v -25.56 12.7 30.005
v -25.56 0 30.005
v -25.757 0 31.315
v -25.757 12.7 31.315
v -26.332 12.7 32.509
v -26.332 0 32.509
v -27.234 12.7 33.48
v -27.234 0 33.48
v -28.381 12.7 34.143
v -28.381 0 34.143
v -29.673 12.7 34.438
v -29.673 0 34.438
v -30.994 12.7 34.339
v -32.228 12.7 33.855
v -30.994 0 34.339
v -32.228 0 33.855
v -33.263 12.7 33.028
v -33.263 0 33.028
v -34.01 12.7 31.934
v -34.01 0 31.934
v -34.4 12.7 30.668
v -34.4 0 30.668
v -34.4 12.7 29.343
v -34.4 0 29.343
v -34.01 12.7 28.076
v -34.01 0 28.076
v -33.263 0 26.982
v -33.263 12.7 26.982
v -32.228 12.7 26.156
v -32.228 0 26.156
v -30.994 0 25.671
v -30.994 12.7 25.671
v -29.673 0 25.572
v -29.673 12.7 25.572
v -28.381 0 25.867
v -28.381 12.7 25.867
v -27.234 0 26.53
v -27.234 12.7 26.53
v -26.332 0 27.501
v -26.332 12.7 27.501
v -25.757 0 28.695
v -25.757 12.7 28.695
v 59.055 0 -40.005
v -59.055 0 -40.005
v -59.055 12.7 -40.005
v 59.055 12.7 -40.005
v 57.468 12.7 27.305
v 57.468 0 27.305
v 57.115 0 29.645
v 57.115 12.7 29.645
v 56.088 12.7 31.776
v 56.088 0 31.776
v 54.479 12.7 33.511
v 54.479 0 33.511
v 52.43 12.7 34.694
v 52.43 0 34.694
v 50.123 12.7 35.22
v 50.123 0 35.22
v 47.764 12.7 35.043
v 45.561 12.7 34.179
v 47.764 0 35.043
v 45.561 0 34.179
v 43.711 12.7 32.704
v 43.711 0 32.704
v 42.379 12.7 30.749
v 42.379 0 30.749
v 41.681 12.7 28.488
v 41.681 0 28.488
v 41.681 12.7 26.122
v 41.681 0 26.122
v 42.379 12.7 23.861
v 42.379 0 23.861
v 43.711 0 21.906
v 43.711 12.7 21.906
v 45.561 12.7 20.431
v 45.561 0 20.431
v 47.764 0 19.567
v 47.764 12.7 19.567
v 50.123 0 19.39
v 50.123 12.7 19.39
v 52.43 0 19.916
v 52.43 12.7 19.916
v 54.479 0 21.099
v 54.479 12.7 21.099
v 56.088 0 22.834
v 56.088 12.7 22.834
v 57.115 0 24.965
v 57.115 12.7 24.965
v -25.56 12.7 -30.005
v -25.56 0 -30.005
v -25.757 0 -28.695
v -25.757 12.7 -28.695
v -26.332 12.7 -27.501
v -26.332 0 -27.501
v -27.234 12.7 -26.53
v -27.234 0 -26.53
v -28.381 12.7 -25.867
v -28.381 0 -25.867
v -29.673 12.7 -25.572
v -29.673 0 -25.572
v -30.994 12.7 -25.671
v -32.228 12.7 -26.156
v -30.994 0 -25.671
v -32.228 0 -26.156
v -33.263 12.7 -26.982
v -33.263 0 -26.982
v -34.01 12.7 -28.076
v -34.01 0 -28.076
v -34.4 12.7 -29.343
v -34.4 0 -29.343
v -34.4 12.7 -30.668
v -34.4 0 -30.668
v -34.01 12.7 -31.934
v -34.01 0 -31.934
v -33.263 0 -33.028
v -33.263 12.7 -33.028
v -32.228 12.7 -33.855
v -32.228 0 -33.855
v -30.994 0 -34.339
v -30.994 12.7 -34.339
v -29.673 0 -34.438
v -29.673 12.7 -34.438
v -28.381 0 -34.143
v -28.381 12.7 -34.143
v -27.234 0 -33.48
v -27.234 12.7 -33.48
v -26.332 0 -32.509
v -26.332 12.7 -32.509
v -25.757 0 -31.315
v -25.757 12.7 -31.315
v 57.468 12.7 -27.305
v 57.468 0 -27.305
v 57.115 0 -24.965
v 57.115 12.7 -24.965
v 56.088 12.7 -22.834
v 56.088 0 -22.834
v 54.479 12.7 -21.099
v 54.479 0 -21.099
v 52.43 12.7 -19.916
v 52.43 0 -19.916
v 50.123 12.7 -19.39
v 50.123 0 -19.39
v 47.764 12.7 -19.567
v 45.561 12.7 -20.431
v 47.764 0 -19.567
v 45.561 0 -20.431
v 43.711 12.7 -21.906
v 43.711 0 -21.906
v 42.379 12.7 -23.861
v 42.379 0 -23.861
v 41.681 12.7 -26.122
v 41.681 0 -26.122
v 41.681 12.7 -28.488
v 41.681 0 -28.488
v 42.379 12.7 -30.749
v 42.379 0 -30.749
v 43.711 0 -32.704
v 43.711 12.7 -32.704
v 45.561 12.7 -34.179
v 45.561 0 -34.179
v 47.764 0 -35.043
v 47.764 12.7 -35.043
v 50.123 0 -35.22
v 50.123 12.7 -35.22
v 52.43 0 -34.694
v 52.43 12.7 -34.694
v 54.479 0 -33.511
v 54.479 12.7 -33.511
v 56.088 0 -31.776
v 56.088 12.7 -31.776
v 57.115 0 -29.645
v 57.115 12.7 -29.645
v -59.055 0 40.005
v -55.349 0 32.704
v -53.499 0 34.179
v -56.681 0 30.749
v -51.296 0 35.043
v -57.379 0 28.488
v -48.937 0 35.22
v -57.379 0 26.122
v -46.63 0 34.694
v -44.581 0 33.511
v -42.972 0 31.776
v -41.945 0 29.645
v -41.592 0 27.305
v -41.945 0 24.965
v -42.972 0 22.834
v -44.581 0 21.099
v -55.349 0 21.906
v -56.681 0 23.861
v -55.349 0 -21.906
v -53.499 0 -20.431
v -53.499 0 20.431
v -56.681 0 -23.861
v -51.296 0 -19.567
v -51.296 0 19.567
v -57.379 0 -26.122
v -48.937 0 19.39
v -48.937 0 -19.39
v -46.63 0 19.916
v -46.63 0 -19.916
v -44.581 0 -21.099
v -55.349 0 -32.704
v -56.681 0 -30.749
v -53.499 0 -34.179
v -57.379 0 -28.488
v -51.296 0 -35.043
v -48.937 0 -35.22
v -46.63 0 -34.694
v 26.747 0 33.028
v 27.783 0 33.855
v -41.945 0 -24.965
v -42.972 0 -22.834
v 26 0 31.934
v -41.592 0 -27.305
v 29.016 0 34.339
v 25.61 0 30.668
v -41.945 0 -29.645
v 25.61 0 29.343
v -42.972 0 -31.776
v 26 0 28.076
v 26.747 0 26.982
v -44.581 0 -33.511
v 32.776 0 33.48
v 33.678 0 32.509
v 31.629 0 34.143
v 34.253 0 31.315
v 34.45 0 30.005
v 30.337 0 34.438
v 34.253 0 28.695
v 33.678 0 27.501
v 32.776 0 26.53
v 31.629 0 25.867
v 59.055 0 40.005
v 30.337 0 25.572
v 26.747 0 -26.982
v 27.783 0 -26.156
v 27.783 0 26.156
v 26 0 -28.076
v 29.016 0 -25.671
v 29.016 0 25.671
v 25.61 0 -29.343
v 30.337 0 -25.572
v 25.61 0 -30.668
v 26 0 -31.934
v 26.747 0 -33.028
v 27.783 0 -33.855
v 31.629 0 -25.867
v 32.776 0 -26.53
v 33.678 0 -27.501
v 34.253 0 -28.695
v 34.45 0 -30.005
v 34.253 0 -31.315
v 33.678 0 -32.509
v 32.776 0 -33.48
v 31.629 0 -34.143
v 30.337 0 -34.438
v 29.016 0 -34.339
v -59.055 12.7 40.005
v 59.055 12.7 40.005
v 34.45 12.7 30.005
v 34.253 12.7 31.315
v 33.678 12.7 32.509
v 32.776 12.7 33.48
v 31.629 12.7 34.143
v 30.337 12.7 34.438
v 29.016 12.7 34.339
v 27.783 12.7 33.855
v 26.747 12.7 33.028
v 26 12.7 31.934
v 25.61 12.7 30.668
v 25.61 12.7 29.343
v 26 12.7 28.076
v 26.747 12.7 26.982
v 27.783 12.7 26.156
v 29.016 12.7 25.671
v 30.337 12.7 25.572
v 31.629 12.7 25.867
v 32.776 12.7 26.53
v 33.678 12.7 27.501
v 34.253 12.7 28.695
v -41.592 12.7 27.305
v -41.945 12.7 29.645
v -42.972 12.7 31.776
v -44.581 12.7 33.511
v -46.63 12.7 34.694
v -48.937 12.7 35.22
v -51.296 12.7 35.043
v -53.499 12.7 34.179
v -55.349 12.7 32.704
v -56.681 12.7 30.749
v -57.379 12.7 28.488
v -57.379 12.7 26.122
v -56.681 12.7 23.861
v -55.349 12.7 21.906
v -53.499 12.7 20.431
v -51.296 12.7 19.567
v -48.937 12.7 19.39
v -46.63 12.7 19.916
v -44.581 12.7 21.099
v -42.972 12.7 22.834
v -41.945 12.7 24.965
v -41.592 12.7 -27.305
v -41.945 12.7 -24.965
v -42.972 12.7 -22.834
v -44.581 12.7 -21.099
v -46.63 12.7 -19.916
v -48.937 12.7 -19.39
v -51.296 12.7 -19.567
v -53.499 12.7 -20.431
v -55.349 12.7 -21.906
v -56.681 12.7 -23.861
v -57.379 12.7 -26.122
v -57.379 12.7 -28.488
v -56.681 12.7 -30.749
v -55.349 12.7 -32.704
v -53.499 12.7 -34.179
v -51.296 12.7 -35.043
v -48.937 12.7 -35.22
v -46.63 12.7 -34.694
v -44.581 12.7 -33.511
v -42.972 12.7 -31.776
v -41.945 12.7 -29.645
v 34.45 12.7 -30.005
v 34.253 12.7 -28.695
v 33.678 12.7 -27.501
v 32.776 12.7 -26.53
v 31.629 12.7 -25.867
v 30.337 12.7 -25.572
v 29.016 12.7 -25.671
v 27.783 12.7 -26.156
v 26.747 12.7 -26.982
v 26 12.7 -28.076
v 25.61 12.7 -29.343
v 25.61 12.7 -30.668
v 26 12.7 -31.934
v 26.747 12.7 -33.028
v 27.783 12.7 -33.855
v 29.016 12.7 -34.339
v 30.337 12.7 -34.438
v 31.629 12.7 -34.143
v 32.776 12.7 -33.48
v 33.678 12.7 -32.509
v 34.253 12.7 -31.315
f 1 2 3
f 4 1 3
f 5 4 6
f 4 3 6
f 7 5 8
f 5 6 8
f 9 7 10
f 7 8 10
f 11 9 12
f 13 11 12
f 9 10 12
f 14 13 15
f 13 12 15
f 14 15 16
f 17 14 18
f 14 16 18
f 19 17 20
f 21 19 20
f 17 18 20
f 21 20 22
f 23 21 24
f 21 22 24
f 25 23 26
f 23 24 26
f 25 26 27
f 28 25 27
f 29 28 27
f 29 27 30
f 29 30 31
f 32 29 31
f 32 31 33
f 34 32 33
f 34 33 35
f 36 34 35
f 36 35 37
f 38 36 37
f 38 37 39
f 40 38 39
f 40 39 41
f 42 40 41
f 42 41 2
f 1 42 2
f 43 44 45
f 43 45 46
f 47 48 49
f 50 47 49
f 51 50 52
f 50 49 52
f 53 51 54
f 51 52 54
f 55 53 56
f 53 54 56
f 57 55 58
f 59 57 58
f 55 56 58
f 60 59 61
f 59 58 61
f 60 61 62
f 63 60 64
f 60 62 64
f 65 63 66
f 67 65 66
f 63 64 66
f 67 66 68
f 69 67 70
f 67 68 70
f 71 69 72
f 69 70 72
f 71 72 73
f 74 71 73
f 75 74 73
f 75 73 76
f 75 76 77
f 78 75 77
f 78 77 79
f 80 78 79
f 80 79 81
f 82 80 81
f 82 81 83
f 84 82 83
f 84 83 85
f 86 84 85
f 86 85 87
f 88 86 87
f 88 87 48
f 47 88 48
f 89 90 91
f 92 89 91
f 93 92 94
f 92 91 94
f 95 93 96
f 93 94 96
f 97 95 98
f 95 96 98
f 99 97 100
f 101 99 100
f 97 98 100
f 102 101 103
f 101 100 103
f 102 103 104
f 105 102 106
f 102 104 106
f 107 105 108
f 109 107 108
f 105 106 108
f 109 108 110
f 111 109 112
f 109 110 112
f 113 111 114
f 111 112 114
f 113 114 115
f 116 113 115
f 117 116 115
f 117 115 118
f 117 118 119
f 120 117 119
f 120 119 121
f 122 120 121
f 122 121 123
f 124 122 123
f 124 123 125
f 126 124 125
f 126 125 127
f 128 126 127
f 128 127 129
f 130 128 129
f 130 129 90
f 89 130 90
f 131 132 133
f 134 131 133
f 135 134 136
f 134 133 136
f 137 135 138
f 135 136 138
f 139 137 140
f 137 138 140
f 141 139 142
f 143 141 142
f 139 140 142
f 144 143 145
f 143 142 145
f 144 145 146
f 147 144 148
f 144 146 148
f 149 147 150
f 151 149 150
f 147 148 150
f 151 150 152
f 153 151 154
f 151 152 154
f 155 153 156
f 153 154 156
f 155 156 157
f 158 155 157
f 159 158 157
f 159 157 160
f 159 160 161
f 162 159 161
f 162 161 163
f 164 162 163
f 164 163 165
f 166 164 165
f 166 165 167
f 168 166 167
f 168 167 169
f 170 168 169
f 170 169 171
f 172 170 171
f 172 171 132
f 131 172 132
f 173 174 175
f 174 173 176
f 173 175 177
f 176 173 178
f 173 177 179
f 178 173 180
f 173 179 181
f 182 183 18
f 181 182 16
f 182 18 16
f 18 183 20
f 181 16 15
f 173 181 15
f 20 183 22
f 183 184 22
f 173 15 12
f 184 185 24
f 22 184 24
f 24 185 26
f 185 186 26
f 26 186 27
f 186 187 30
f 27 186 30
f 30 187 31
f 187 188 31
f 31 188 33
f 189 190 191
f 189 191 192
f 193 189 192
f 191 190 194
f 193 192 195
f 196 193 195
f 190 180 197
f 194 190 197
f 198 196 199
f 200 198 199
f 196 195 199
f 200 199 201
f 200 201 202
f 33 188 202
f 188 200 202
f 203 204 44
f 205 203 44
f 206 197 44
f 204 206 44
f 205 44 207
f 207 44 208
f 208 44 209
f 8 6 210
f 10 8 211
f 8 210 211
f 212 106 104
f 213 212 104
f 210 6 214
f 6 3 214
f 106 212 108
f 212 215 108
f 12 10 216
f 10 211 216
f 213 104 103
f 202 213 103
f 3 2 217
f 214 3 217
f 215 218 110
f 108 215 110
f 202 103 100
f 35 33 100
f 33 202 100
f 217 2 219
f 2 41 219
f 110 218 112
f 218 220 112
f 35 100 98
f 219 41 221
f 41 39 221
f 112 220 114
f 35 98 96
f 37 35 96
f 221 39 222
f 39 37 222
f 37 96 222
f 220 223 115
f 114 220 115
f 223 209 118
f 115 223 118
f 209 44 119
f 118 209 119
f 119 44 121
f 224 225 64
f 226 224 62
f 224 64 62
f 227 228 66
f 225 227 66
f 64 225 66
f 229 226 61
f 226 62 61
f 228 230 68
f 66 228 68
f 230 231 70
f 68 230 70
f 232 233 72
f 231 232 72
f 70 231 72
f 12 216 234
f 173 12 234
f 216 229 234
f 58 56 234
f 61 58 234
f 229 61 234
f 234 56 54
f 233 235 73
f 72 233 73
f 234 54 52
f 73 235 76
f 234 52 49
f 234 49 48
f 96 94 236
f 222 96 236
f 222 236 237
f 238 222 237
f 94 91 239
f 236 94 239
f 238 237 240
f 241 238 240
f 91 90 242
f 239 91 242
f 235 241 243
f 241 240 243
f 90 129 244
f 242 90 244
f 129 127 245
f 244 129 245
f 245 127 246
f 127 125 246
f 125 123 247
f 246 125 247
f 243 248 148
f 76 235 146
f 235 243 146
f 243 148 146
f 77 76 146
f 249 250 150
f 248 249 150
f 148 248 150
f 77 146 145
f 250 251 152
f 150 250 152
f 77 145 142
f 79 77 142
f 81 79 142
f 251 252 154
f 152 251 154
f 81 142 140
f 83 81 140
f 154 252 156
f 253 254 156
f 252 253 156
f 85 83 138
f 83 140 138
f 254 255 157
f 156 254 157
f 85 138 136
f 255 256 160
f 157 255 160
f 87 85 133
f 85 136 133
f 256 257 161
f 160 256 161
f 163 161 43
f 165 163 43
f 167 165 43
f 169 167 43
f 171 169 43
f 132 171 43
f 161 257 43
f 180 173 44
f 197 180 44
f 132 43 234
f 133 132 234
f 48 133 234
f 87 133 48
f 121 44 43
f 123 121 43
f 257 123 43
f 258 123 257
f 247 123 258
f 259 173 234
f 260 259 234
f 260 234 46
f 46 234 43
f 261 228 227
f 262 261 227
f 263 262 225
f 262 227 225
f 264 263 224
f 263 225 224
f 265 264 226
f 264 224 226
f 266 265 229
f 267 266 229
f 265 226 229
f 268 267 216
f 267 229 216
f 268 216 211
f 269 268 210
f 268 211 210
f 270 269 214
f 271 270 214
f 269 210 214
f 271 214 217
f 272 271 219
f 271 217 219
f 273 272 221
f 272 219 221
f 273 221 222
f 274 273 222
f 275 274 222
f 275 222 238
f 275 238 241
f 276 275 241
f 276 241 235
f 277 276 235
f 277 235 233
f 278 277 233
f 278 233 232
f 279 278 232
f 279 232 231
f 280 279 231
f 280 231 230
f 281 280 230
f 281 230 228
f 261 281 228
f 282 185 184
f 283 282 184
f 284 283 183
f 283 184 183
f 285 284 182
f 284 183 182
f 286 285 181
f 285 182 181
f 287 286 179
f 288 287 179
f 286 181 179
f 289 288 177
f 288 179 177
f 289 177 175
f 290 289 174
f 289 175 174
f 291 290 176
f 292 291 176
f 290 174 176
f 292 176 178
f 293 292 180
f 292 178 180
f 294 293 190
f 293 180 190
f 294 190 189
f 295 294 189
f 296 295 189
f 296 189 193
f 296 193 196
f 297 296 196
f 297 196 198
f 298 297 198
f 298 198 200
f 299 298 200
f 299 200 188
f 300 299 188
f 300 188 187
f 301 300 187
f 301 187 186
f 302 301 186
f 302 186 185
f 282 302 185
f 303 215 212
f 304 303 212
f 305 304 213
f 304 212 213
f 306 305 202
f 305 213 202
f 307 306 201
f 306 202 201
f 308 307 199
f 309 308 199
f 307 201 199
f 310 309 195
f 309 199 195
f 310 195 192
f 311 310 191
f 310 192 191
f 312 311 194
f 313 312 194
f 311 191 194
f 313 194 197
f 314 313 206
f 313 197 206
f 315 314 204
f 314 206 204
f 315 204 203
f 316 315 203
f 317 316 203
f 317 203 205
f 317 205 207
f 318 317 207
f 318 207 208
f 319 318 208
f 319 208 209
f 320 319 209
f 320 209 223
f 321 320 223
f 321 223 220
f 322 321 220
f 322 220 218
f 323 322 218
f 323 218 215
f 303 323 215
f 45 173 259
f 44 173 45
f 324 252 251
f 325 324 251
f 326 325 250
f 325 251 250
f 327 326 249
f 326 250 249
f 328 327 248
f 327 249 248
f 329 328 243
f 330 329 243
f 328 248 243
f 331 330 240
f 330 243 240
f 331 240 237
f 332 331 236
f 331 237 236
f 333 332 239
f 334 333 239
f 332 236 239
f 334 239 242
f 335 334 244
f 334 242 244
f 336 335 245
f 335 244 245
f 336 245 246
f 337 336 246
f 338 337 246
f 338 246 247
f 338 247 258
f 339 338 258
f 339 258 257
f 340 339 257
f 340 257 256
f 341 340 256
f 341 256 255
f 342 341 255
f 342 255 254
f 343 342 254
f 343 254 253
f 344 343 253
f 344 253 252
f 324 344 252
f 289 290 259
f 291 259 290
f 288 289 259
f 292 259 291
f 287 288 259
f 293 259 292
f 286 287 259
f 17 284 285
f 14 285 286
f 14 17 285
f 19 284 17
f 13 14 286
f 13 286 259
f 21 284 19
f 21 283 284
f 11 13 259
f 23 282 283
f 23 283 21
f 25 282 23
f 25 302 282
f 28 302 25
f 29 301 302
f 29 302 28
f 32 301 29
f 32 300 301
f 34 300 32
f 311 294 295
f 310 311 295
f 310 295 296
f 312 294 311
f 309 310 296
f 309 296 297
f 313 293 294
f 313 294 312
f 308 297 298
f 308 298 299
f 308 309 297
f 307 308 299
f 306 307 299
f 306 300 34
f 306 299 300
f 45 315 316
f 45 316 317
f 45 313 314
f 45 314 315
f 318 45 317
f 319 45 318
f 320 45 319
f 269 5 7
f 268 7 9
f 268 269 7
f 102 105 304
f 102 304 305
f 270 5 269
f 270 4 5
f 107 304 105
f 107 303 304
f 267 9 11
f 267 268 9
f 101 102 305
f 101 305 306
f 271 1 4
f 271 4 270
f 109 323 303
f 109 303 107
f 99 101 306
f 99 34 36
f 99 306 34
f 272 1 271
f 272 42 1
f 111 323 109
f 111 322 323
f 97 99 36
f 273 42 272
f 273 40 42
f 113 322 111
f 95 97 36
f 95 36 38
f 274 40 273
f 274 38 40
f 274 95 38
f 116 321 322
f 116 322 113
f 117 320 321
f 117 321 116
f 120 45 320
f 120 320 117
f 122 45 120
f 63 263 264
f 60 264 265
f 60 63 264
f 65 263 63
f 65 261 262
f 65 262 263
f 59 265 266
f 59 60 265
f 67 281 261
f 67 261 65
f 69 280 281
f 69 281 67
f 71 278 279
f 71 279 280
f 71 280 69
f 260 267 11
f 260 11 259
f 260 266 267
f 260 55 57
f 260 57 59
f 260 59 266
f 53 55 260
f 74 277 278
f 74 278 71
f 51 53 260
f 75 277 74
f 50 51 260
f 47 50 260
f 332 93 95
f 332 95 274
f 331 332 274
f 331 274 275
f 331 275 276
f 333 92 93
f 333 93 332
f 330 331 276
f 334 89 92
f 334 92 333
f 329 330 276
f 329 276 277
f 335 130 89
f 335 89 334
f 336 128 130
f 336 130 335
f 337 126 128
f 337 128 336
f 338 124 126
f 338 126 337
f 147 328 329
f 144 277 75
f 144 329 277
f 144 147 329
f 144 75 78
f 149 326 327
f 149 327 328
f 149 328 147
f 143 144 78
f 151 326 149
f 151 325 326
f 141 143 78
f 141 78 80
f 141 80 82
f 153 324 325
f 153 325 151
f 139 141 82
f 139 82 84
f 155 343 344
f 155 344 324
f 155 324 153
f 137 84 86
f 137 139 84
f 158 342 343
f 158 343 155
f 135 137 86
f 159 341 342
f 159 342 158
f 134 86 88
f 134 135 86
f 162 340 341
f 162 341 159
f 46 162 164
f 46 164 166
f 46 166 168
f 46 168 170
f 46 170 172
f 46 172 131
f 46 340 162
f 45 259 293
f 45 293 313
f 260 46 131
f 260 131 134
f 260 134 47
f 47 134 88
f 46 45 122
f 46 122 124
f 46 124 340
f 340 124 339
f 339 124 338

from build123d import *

# Parameters (mm, degrees)
SKETCH1_W           = 118.11
SKETCH1_H           = 80.01
BOSS_EXTRUDE1_DEPTH = 12.7
SKETCH2_R           = 4.445
CUT_EXTRUDE1_DEPTH  = 13.7
SKETCH3_R           = 7.9375
CUT_EXTRUDE2_DEPTH  = 13.7


with BuildPart() as part:
    # Sketch1 → Boss-Extrude1 (new body)
    with BuildSketch(Plane(origin=(0, 0, 0), x_dir=(1, 0, 0), z_dir=(0, 1, 0))):
        Rectangle(SKETCH1_W, SKETCH1_H)
    extrude(amount=BOSS_EXTRUDE1_DEPTH)

    # Sketch2 → Cut-Extrude1 (cut, through all)
    with BuildSketch(Plane.XZ):
        with Locations((-30.00502, 30.00502)):
            Circle(SKETCH2_R)
        with Locations((30.00502, 30.00502)):
            Circle(SKETCH2_R)
        with Locations((-30.00502, -30.00502)):
            Circle(SKETCH2_R)
        with Locations((30.00502, -30.00502)):
            Circle(SKETCH2_R)
    extrude(amount=-CUT_EXTRUDE1_DEPTH, mode=Mode.SUBTRACT)

    # Sketch3 → Cut-Extrude2 (cut, through all)
    with BuildSketch(Plane.XZ):
        with Locations((-49.53, 27.305)):
            Circle(SKETCH3_R)
        with Locations((-49.53, -27.305)):
            Circle(SKETCH3_R)
        with Locations((49.53, -27.305)):
            Circle(SKETCH3_R)
        with Locations((49.53, 27.305)):
            Circle(SKETCH3_R)
    extrude(amount=-CUT_EXTRUDE2_DEPTH, mode=Mode.SUBTRACT)


solid = part.part
